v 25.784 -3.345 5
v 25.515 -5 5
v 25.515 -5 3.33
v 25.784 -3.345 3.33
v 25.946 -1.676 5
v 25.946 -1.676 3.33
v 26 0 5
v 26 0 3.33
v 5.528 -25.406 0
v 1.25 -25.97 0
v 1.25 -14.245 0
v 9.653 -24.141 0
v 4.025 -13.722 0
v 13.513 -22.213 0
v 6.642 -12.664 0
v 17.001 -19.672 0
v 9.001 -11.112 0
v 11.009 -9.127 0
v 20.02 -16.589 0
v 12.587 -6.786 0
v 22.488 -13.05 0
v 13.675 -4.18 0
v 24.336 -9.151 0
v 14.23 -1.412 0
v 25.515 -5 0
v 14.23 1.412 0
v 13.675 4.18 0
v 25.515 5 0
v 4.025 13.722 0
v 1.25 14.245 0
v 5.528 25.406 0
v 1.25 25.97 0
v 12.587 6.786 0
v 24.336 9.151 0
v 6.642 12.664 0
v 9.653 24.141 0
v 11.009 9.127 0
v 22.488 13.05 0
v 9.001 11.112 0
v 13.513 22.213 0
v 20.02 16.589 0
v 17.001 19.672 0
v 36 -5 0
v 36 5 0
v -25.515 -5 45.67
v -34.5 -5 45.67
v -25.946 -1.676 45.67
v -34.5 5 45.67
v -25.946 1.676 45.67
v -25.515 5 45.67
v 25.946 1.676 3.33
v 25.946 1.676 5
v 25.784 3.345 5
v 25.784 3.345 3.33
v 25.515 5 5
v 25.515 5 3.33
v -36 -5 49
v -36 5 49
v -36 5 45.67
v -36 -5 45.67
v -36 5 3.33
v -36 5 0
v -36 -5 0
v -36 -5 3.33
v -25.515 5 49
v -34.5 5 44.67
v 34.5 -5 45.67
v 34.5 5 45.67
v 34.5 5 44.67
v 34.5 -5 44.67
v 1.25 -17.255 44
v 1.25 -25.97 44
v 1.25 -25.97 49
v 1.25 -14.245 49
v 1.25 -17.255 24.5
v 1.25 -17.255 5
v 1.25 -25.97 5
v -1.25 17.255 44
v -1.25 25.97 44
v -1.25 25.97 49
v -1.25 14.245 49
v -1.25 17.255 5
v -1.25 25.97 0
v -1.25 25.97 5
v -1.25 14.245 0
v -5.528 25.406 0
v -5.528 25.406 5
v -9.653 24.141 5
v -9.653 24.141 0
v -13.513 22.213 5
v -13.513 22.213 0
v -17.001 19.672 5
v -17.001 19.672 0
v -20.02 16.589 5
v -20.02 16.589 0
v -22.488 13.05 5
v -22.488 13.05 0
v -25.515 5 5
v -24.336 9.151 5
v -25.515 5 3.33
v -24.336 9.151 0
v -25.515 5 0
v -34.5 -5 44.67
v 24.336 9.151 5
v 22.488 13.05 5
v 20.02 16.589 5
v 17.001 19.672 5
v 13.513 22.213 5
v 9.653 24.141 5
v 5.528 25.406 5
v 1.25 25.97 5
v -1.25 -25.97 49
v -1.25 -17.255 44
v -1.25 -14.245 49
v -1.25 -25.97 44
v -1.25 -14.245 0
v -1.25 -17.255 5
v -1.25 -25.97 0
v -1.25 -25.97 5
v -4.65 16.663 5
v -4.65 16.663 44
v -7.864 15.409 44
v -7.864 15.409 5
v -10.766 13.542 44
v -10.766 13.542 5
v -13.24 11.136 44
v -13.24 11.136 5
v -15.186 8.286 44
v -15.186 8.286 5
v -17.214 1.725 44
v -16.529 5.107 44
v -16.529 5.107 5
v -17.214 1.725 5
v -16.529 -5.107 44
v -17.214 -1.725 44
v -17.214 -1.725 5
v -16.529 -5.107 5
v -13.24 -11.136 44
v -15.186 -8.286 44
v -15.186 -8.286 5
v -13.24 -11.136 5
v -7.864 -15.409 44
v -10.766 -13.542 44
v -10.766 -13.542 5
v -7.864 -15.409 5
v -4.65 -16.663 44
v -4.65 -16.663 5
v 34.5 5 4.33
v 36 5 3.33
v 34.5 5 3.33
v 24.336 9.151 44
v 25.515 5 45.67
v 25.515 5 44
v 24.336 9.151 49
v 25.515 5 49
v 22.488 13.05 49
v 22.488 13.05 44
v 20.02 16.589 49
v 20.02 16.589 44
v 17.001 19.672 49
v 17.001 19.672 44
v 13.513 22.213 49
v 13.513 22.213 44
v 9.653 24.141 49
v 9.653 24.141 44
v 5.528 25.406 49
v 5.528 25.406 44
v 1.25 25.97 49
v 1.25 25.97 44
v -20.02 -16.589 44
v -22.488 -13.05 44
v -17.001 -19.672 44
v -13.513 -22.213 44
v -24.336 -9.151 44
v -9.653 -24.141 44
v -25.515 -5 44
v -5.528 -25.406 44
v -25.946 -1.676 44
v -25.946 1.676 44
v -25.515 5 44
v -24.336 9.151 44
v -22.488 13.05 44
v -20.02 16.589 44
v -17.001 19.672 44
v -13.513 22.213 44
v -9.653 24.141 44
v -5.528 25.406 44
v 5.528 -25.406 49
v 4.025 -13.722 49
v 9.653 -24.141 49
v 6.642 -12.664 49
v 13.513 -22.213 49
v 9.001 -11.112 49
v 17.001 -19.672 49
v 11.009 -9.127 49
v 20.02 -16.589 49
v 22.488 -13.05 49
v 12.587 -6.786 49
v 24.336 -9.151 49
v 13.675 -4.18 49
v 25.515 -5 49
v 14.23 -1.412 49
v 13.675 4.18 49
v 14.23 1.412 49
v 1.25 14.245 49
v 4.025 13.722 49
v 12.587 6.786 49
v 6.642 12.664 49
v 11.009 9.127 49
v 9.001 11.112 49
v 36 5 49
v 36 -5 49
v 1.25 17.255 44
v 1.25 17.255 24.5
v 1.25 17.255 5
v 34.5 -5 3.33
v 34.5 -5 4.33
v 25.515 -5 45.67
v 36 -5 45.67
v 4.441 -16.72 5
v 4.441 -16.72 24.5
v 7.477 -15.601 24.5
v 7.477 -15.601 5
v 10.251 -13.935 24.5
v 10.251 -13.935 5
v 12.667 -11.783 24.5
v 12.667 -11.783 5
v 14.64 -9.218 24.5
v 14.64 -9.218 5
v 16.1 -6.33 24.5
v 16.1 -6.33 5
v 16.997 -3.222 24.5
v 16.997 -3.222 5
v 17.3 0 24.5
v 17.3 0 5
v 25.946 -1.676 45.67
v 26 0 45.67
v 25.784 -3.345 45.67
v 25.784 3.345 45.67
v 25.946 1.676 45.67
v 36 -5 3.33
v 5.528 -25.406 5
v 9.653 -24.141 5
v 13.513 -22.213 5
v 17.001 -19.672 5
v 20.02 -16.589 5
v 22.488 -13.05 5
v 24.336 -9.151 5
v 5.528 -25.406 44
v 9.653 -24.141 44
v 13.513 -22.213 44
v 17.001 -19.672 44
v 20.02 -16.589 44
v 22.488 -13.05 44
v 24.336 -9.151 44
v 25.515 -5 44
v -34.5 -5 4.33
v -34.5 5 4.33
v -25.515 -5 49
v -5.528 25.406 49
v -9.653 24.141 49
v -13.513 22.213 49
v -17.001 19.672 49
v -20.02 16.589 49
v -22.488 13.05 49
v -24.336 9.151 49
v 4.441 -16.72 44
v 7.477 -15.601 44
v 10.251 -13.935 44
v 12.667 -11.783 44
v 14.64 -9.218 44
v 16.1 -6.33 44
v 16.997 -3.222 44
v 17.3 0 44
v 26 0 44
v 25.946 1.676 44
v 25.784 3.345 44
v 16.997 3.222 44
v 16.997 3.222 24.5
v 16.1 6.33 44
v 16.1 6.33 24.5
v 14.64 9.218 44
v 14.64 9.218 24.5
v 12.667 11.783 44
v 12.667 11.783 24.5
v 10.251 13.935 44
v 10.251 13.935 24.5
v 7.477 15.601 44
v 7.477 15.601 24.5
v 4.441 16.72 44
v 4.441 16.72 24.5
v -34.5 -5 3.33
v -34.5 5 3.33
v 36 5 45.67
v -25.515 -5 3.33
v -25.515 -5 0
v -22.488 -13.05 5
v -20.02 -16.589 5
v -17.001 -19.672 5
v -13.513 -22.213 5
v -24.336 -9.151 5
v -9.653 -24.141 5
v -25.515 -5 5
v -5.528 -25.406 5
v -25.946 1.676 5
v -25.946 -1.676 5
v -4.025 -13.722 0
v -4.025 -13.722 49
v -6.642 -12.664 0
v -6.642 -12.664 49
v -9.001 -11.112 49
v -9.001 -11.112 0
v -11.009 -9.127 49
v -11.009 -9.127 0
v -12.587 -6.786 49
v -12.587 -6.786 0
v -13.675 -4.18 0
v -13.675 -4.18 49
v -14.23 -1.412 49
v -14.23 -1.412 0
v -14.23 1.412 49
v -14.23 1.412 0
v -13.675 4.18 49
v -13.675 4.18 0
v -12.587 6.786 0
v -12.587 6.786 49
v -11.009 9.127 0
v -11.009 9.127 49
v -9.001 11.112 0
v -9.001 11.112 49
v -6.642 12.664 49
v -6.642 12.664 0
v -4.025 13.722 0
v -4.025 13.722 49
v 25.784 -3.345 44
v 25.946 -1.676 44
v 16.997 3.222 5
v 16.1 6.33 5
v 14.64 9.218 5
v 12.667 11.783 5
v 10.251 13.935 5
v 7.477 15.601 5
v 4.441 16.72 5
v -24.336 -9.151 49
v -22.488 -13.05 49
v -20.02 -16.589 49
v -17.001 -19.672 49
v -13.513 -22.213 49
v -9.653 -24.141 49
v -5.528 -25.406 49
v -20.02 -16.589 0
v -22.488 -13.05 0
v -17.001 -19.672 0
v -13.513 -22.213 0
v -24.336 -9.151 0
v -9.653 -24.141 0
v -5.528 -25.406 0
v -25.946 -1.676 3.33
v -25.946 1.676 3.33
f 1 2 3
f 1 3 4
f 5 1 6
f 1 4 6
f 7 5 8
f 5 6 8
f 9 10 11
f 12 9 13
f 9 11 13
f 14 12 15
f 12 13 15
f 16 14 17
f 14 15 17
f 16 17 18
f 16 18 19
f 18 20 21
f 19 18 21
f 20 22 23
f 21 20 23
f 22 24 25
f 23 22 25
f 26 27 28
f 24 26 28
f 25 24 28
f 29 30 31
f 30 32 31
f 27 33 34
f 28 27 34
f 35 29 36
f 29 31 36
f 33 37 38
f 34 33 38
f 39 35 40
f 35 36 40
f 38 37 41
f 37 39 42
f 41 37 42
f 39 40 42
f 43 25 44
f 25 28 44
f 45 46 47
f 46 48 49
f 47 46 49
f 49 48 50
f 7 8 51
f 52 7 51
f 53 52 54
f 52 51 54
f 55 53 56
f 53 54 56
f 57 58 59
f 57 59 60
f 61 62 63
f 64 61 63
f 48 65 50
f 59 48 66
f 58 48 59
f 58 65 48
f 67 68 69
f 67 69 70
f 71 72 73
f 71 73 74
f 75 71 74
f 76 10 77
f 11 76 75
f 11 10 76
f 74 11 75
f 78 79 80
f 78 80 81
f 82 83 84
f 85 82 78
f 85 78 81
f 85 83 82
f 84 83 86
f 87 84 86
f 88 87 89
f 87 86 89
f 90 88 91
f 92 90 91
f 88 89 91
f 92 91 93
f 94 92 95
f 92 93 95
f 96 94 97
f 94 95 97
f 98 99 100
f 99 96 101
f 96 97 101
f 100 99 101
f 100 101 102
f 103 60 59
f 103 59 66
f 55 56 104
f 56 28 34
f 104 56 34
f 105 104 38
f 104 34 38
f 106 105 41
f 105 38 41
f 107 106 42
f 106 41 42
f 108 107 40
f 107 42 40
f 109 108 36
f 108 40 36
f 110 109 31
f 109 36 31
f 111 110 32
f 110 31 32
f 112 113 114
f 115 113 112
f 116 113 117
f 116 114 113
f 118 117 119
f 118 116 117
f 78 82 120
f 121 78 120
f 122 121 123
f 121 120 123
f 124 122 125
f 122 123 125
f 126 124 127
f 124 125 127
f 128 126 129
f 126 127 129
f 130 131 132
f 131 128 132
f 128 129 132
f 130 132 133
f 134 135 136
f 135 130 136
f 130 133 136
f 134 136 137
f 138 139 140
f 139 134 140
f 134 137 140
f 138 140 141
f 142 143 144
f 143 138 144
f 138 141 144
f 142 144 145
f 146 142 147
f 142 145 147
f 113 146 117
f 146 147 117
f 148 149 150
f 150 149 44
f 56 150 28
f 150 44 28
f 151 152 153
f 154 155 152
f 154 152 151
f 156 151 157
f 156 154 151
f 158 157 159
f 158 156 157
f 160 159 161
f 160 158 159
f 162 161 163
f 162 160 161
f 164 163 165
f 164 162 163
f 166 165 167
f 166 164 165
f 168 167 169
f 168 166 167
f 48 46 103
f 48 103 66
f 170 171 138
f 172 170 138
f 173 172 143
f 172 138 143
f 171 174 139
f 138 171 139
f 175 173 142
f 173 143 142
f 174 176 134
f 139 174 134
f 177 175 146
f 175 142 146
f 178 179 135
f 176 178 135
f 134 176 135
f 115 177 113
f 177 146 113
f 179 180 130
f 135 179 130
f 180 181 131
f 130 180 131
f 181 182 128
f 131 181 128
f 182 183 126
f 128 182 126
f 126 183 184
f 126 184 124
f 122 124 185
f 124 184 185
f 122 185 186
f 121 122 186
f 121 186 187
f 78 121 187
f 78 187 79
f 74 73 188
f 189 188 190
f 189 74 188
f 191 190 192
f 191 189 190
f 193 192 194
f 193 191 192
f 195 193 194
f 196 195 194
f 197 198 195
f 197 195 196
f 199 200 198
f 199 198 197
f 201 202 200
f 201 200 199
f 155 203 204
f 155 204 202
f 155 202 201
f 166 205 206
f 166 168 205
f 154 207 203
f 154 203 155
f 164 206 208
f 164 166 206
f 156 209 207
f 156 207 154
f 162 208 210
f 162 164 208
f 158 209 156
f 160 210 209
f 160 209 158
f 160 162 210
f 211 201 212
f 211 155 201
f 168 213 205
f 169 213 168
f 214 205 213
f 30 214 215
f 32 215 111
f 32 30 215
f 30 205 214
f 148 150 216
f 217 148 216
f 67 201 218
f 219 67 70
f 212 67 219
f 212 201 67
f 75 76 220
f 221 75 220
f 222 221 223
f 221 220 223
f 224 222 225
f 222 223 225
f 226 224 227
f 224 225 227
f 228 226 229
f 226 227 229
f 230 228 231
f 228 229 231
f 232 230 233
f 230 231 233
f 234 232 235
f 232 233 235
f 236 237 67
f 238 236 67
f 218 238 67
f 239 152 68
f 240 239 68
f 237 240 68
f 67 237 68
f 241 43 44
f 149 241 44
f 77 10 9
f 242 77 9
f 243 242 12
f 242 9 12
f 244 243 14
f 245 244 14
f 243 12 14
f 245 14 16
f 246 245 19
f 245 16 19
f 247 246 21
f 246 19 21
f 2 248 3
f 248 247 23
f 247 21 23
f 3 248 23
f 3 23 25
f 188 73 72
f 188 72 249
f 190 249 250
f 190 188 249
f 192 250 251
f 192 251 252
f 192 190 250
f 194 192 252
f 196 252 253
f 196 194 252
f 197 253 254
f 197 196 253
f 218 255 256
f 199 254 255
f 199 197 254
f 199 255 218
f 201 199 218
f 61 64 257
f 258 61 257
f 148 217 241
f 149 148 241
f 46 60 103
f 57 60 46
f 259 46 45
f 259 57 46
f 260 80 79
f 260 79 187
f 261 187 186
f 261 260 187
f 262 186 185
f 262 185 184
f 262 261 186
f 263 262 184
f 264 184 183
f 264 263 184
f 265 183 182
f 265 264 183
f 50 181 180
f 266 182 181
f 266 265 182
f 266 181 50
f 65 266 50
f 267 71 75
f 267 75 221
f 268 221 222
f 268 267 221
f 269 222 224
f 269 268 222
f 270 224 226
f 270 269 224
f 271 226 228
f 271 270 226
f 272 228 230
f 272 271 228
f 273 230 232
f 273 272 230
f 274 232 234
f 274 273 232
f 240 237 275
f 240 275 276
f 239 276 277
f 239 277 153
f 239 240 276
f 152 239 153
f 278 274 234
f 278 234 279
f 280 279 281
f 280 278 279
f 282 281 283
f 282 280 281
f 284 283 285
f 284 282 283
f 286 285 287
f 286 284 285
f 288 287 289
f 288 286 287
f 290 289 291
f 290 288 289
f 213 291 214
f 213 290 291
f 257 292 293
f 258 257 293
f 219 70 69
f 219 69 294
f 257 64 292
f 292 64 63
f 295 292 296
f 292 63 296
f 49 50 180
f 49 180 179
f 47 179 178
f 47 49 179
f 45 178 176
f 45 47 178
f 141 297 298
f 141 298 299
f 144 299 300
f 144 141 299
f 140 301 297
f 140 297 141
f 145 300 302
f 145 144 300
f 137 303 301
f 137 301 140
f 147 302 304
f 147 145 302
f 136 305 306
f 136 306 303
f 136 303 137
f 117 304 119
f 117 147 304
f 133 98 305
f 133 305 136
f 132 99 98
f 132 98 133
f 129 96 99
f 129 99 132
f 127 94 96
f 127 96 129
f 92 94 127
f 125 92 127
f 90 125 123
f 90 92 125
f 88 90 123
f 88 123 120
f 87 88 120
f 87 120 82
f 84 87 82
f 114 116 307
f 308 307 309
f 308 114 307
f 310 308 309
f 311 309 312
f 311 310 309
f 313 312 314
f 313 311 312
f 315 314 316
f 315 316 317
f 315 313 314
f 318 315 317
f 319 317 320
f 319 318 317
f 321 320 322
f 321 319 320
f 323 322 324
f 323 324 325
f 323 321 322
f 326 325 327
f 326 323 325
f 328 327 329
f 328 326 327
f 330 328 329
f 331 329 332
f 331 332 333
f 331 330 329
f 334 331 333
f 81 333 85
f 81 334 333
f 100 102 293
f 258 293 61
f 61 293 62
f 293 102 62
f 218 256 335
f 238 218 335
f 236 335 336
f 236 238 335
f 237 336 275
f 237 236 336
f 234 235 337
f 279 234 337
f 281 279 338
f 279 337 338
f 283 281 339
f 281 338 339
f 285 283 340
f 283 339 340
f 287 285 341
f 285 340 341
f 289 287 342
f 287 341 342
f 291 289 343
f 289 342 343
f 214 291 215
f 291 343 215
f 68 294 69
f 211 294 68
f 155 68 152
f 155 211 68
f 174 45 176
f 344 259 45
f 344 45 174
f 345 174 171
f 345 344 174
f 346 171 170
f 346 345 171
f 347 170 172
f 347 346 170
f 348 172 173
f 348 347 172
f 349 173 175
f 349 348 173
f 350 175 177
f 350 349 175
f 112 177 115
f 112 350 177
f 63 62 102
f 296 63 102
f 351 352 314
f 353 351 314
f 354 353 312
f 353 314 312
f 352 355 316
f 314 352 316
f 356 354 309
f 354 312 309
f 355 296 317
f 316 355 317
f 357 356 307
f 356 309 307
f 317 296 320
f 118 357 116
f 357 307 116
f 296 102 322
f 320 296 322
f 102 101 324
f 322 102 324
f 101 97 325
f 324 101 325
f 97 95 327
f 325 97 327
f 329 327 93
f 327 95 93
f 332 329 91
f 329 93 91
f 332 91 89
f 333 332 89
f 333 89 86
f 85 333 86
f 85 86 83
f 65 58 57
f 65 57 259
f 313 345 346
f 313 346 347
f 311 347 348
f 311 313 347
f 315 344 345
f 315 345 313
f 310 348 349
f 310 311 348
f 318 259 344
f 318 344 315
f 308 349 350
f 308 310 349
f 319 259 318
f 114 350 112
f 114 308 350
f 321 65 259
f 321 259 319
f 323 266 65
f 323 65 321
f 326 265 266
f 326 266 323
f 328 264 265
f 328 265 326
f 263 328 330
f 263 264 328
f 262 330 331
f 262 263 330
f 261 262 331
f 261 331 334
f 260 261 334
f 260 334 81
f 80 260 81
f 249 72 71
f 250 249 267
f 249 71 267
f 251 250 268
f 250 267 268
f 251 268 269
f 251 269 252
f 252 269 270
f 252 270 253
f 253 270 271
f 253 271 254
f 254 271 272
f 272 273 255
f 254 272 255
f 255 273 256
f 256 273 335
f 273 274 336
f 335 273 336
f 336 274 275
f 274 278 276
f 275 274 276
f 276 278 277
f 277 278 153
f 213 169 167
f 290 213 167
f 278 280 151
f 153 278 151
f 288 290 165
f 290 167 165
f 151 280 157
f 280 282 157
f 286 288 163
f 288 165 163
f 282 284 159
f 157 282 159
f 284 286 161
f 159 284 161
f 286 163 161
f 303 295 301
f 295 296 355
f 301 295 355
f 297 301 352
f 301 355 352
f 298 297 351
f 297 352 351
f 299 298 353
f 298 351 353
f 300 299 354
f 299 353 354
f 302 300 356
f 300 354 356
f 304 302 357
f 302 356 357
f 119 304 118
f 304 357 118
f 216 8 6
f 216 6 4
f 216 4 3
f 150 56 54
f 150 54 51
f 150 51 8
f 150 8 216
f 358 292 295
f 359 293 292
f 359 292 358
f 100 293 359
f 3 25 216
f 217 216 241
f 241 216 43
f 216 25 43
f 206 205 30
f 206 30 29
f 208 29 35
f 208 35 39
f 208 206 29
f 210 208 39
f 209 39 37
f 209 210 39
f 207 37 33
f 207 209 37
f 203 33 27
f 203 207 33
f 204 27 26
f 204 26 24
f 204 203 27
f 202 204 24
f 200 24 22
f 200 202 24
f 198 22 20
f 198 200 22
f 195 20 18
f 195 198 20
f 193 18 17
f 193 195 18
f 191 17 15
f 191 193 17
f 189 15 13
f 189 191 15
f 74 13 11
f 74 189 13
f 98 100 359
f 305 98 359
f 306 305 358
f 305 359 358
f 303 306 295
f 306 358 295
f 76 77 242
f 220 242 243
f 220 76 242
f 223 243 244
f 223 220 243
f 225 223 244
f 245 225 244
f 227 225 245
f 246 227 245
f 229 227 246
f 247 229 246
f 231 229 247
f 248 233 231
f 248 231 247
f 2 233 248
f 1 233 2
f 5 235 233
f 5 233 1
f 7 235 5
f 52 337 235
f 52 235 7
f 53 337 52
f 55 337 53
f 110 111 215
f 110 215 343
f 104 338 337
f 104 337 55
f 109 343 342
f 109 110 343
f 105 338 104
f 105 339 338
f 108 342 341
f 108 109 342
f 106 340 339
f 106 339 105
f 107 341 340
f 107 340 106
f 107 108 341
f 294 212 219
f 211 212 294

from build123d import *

# Parameters (mm, degrees)
F1_DEPTH = 5
F2_DEPTH = 3.33
F3_DEPTH = 4.33
F6_DEPTH = 10
F7_DEPTH = 24.5
F9_DEPTH = 49.001


with BuildPart() as f1:
    # F0 (on Top) → F1 (new body)
    with BuildSketch(Plane.XY):
        with BuildLine():
            Line((-1.25, 17.2547819459), (-1.25, 25.9699345398))
            ThreePointArc((-1.25, 25.9699345398), (-17.000642699, 19.6717601607), (-25.5147016443, 5))
            ThreePointArc((-25.5147016443, 5), (-26, 0), (-25.5147016443, -5))
            ThreePointArc((-25.5147016443, -5), (-17.000642699, -19.6717601607), (-1.25, -25.9699345398))
            Line((-1.25, -25.9699345398), (-1.25, -17.2547819459))
            ThreePointArc((-1.25, -17.2547819459), (-17.3, 0), (-1.25, 17.2547819459))
        make_face()
        with BuildLine():
            ThreePointArc((25.5147016443, -5), (25.8783910121, -2.511748121), (26, 0))
            ThreePointArc((26, 0), (25.8783910121, 2.511748121), (25.5147016443, 5))
            ThreePointArc((25.5147016443, 5), (17.000642699, 19.6717601607), (1.25, 25.9699345398))
            Line((1.25, 25.9699345398), (1.25, 17.2547819459))
            ThreePointArc((1.25, 17.2547819459), (12.6671820071, 11.782720399), (17.3, 0))
            ThreePointArc((17.3, 0), (12.6671820071, -11.782720399), (1.25, -17.2547819459))
            Line((1.25, -17.2547819459), (1.25, -25.9699345398))
            ThreePointArc((1.25, -25.9699345398), (17.000642699, -19.6717601607), (25.5147016443, -5))
        make_face()
        with BuildLine():
            Line((1.25, 17.2547819459), (1.25, 25.9699345398))
            ThreePointArc((1.25, 25.9699345398), (0, 26), (-1.25, 25.9699345398))
            Line((-1.25, 25.9699345398), (-1.25, 17.2547819459))
            ThreePointArc((-1.25, 17.2547819459), (0, 17.3), (1.25, 17.2547819459))
        make_face()
        with BuildLine():
            ThreePointArc((-1.25, -25.9699345398), (0, -26), (1.25, -25.9699345398))
            Line((1.25, -25.9699345398), (1.25, -17.2547819459))
            ThreePointArc((1.25, -17.2547819459), (0, -17.3), (-1.25, -17.2547819459))
            Line((-1.25, -17.2547819459), (-1.25, -25.9699345398))
        make_face()
        with BuildLine():
            Line((-1.25, 14.2452623703), (-1.25, 17.2547819459))
            ThreePointArc((-1.25, 17.2547819459), (-17.3, 0), (-1.25, -17.2547819459))
            Line((-1.25, -17.2547819459), (-1.25, -14.2452623703))
            ThreePointArc((-1.25, -14.2452623703), (-14.3, 0), (-1.25, 14.2452623703))
        make_face()
        with BuildLine():
            ThreePointArc((17.3, 0), (12.6671820071, 11.782720399), (1.25, 17.2547819459))
            Line((1.25, 17.2547819459), (1.25, 14.2452623703))
            ThreePointArc((1.25, 14.2452623703), (10.5443112625, 9.6595807362), (14.3, 0))
            ThreePointArc((14.3, 0), (10.5443112625, -9.6595807362), (1.25, -14.2452623703))
            Line((1.25, -14.2452623703), (1.25, -17.2547819459))
            ThreePointArc((1.25, -17.2547819459), (12.6671820071, -11.782720399), (17.3, 0))
        make_face()
        with BuildLine():
            ThreePointArc((-1.25, -17.2547819459), (0, -17.3), (1.25, -17.2547819459))
            Line((1.25, -17.2547819459), (1.25, -14.2452623703))
            ThreePointArc((1.25, -14.2452623703), (0, -14.3), (-1.25, -14.2452623703))
            Line((-1.25, -14.2452623703), (-1.25, -17.2547819459))
        make_face()
        with BuildLine():
            Line((1.25, 14.2452623703), (1.25, 17.2547819459))
            ThreePointArc((1.25, 17.2547819459), (0, 17.3), (-1.25, 17.2547819459))
            Line((-1.25, 17.2547819459), (-1.25, 14.2452623703))
            ThreePointArc((-1.25, 14.2452623703), (0, 14.3), (1.25, 14.2452623703))
        make_face()
    extrude(amount=F1_DEPTH)

    # F0 (on Top) → F2 (join)
    with BuildSketch(Plane.XY):
        with BuildLine():
            ThreePointArc((-25.5147016443, -5), (-26, 0), (-25.5147016443, 5))
            Line((-25.5147016443, 5), (-34.5, 5))
            Line((-34.5, 5), (-34.5, 0))
            Line((-34.5, 0), (-34.5, -5))
            Line((-34.5, -5), (-25.5147016443, -5))
        make_face()
        Polygon((-34.5, 0), (-34.5, 5), (-36, 5), (-36, 0), (-36, -5), (-34.5, -5), align=None)
        with BuildLine():
            ThreePointArc((25.5147016443, 5), (25.8783910121, 2.511748121), (26, 0))
            ThreePointArc((26, 0), (25.8783910121, -2.511748121), (25.5147016443, -5))
            Line((25.5147016443, -5), (34.5, -5))
            Line((34.5, -5), (34.5, 0))
            Line((34.5, 0), (34.5, 5))
            Line((34.5, 5), (25.5147016443, 5))
        make_face()
        Polygon((36, 5), (34.5, 5), (34.5, 0), (34.5, -5), (36, -5), (36, 0), align=None)
    extrude(amount=F2_DEPTH)

    # F0 (on Top) → F3 (join)
    with BuildSketch(Plane.XY):
        Polygon((-34.5, 0), (-34.5, 5), (-36, 5), (-36, 0), (-36, -5), (-34.5, -5), align=None)
        Polygon((36, 5), (34.5, 5), (34.5, 0), (34.5, -5), (36, -5), (36, 0), align=None)
    extrude(amount=F3_DEPTH)

    # F4 (on face) + F5 (on face) → F6 (cut, through all)
    with BuildSketch(Plane.XZ.offset(5)):
        Polygon((-36, 3.33), (-34.5, 4.33), (-36, 4.33), align=None)
    with BuildSketch(Plane.XZ.offset(5)):
        Polygon((36, 4.33), (34.5, 4.33), (36, 3.33), align=None)
    extrude(amount=-F6_DEPTH, mode=Mode.SUBTRACT)

    # F0 (on Top) → F7 (join)
    with BuildSketch(Plane.XY):
        with BuildLine():
            Line((-1.25, 14.2452623703), (-1.25, 17.2547819459))
            ThreePointArc((-1.25, 17.2547819459), (-17.3, 0), (-1.25, -17.2547819459))
            Line((-1.25, -17.2547819459), (-1.25, -14.2452623703))
            ThreePointArc((-1.25, -14.2452623703), (-14.3, 0), (-1.25, 14.2452623703))
        make_face()
        with BuildLine():
            ThreePointArc((17.3, 0), (12.6671820071, 11.782720399), (1.25, 17.2547819459))
            Line((1.25, 17.2547819459), (1.25, 14.2452623703))
            ThreePointArc((1.25, 14.2452623703), (10.5443112625, 9.6595807362), (14.3, 0))
            ThreePointArc((14.3, 0), (10.5443112625, -9.6595807362), (1.25, -14.2452623703))
            Line((1.25, -14.2452623703), (1.25, -17.2547819459))
            ThreePointArc((1.25, -17.2547819459), (12.6671820071, -11.782720399), (17.3, 0))
        make_face()
        with BuildLine():
            ThreePointArc((-1.25, -17.2547819459), (0, -17.3), (1.25, -17.2547819459))
            Line((1.25, -17.2547819459), (1.25, -14.2452623703))
            ThreePointArc((1.25, -14.2452623703), (0, -14.3), (-1.25, -14.2452623703))
            Line((-1.25, -14.2452623703), (-1.25, -17.2547819459))
        make_face()
        with BuildLine():
            Line((1.25, 14.2452623703), (1.25, 17.2547819459))
            ThreePointArc((1.25, 17.2547819459), (0, 17.3), (-1.25, 17.2547819459))
            Line((-1.25, 17.2547819459), (-1.25, 14.2452623703))
            ThreePointArc((-1.25, 14.2452623703), (0, 14.3), (1.25, 14.2452623703))
        make_face()
    extrude(amount=F7_DEPTH)

    # F8: F1 across face


with BuildPart() as f1_1:
    add(f1.part)
    add(f1.part.mirror(Plane.XY.offset(24.5)))

    # F0 (on Top) → F9 (cut, through all)
    with BuildSketch(Plane.XY):
        with BuildLine():
            ThreePointArc((-1.25, -25.9699345398), (0, -26), (1.25, -25.9699345398))
            Line((1.25, -25.9699345398), (1.25, -17.2547819459))
            ThreePointArc((1.25, -17.2547819459), (0, -17.3), (-1.25, -17.2547819459))
            Line((-1.25, -17.2547819459), (-1.25, -25.9699345398))
        make_face()
        with BuildLine():
            Line((1.25, 17.2547819459), (1.25, 25.9699345398))
            ThreePointArc((1.25, 25.9699345398), (0, 26), (-1.25, 25.9699345398))
            Line((-1.25, 25.9699345398), (-1.25, 17.2547819459))
            ThreePointArc((-1.25, 17.2547819459), (0, 17.3), (1.25, 17.2547819459))
        make_face()
        with BuildLine():
            ThreePointArc((-1.25, -17.2547819459), (0, -17.3), (1.25, -17.2547819459))
            Line((1.25, -17.2547819459), (1.25, -14.2452623703))
            ThreePointArc((1.25, -14.2452623703), (0, -14.3), (-1.25, -14.2452623703))
            Line((-1.25, -14.2452623703), (-1.25, -17.2547819459))
        make_face()
        with BuildLine():
            Line((1.25, 14.2452623703), (1.25, 17.2547819459))
            ThreePointArc((1.25, 17.2547819459), (0, 17.3), (-1.25, 17.2547819459))
            Line((-1.25, 17.2547819459), (-1.25, 14.2452623703))
            ThreePointArc((-1.25, 14.2452623703), (0, 14.3), (1.25, 14.2452623703))
        make_face()
    extrude(amount=F9_DEPTH, mode=Mode.SUBTRACT)


solid = f1_1.part
